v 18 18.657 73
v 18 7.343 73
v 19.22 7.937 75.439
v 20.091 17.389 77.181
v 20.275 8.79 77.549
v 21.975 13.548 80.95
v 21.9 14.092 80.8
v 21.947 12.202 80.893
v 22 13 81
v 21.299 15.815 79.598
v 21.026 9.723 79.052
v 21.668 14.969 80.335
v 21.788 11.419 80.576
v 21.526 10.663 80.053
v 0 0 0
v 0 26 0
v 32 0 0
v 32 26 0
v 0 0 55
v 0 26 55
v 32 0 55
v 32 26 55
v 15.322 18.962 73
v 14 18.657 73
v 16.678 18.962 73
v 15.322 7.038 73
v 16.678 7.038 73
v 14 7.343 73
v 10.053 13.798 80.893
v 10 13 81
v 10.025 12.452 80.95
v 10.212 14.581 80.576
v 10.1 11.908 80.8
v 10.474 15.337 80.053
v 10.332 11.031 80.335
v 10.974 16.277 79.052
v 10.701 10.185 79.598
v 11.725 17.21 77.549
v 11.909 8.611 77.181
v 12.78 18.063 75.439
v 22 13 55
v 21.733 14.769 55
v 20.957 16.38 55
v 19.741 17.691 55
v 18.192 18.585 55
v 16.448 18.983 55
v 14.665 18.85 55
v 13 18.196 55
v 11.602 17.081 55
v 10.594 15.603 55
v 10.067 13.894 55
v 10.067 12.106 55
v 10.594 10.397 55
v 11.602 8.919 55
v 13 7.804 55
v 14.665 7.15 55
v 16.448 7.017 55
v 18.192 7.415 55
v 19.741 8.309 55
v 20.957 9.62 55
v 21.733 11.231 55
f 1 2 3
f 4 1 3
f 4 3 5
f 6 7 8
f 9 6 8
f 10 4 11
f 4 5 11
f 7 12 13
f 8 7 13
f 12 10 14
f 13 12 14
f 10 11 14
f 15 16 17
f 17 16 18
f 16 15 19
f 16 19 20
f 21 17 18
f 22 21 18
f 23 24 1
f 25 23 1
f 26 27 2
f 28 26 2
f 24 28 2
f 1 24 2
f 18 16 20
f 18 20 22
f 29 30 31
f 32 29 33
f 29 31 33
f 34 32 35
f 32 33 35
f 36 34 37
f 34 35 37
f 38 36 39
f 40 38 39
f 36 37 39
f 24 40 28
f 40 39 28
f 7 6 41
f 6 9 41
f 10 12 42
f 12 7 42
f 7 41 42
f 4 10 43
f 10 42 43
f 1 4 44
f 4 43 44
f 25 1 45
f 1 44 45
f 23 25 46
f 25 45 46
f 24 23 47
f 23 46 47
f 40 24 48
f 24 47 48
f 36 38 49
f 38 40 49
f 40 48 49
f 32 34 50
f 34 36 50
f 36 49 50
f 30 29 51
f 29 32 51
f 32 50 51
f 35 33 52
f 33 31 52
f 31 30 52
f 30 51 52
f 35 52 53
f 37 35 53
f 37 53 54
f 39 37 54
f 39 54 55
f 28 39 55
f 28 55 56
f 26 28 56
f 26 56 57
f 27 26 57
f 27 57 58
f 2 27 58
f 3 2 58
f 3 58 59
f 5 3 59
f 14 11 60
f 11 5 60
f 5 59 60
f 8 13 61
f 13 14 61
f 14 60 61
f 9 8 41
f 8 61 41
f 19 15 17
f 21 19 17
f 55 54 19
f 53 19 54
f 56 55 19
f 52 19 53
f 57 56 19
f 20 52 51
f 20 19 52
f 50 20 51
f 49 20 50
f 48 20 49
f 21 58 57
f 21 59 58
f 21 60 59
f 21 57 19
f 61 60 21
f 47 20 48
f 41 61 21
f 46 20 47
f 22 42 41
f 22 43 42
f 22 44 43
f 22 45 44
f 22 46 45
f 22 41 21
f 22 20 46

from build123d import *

# Parameters (mm, degrees)
F0_W     = 32
F0_H     = 26
F1_DEPTH = 55
F2_R     = 6
F3_DEPTH = 26
F5_DEPTH = 25


with BuildPart() as f1:
    # F0 (on Top) → F1 (new body)
    with BuildSketch(Plane.XY):
        with Locations((16, 13)):
            Rectangle(F0_W, F0_H)
    extrude(amount=F1_DEPTH)

    # F2 (on face) → F3 (join)
    with BuildSketch(Plane.XY.offset(55)):
        with Locations((16, 13)):
            Circle(F2_R)
    extrude(amount=F3_DEPTH)

    # F4 (on face) → F5 (cut)
    with BuildSketch(Plane.XZ):
        Polygon((22, 81), (10, 81), (14, 73), (18, 73), align=None)
    extrude(amount=-F5_DEPTH, mode=Mode.SUBTRACT)


solid = f1.part
